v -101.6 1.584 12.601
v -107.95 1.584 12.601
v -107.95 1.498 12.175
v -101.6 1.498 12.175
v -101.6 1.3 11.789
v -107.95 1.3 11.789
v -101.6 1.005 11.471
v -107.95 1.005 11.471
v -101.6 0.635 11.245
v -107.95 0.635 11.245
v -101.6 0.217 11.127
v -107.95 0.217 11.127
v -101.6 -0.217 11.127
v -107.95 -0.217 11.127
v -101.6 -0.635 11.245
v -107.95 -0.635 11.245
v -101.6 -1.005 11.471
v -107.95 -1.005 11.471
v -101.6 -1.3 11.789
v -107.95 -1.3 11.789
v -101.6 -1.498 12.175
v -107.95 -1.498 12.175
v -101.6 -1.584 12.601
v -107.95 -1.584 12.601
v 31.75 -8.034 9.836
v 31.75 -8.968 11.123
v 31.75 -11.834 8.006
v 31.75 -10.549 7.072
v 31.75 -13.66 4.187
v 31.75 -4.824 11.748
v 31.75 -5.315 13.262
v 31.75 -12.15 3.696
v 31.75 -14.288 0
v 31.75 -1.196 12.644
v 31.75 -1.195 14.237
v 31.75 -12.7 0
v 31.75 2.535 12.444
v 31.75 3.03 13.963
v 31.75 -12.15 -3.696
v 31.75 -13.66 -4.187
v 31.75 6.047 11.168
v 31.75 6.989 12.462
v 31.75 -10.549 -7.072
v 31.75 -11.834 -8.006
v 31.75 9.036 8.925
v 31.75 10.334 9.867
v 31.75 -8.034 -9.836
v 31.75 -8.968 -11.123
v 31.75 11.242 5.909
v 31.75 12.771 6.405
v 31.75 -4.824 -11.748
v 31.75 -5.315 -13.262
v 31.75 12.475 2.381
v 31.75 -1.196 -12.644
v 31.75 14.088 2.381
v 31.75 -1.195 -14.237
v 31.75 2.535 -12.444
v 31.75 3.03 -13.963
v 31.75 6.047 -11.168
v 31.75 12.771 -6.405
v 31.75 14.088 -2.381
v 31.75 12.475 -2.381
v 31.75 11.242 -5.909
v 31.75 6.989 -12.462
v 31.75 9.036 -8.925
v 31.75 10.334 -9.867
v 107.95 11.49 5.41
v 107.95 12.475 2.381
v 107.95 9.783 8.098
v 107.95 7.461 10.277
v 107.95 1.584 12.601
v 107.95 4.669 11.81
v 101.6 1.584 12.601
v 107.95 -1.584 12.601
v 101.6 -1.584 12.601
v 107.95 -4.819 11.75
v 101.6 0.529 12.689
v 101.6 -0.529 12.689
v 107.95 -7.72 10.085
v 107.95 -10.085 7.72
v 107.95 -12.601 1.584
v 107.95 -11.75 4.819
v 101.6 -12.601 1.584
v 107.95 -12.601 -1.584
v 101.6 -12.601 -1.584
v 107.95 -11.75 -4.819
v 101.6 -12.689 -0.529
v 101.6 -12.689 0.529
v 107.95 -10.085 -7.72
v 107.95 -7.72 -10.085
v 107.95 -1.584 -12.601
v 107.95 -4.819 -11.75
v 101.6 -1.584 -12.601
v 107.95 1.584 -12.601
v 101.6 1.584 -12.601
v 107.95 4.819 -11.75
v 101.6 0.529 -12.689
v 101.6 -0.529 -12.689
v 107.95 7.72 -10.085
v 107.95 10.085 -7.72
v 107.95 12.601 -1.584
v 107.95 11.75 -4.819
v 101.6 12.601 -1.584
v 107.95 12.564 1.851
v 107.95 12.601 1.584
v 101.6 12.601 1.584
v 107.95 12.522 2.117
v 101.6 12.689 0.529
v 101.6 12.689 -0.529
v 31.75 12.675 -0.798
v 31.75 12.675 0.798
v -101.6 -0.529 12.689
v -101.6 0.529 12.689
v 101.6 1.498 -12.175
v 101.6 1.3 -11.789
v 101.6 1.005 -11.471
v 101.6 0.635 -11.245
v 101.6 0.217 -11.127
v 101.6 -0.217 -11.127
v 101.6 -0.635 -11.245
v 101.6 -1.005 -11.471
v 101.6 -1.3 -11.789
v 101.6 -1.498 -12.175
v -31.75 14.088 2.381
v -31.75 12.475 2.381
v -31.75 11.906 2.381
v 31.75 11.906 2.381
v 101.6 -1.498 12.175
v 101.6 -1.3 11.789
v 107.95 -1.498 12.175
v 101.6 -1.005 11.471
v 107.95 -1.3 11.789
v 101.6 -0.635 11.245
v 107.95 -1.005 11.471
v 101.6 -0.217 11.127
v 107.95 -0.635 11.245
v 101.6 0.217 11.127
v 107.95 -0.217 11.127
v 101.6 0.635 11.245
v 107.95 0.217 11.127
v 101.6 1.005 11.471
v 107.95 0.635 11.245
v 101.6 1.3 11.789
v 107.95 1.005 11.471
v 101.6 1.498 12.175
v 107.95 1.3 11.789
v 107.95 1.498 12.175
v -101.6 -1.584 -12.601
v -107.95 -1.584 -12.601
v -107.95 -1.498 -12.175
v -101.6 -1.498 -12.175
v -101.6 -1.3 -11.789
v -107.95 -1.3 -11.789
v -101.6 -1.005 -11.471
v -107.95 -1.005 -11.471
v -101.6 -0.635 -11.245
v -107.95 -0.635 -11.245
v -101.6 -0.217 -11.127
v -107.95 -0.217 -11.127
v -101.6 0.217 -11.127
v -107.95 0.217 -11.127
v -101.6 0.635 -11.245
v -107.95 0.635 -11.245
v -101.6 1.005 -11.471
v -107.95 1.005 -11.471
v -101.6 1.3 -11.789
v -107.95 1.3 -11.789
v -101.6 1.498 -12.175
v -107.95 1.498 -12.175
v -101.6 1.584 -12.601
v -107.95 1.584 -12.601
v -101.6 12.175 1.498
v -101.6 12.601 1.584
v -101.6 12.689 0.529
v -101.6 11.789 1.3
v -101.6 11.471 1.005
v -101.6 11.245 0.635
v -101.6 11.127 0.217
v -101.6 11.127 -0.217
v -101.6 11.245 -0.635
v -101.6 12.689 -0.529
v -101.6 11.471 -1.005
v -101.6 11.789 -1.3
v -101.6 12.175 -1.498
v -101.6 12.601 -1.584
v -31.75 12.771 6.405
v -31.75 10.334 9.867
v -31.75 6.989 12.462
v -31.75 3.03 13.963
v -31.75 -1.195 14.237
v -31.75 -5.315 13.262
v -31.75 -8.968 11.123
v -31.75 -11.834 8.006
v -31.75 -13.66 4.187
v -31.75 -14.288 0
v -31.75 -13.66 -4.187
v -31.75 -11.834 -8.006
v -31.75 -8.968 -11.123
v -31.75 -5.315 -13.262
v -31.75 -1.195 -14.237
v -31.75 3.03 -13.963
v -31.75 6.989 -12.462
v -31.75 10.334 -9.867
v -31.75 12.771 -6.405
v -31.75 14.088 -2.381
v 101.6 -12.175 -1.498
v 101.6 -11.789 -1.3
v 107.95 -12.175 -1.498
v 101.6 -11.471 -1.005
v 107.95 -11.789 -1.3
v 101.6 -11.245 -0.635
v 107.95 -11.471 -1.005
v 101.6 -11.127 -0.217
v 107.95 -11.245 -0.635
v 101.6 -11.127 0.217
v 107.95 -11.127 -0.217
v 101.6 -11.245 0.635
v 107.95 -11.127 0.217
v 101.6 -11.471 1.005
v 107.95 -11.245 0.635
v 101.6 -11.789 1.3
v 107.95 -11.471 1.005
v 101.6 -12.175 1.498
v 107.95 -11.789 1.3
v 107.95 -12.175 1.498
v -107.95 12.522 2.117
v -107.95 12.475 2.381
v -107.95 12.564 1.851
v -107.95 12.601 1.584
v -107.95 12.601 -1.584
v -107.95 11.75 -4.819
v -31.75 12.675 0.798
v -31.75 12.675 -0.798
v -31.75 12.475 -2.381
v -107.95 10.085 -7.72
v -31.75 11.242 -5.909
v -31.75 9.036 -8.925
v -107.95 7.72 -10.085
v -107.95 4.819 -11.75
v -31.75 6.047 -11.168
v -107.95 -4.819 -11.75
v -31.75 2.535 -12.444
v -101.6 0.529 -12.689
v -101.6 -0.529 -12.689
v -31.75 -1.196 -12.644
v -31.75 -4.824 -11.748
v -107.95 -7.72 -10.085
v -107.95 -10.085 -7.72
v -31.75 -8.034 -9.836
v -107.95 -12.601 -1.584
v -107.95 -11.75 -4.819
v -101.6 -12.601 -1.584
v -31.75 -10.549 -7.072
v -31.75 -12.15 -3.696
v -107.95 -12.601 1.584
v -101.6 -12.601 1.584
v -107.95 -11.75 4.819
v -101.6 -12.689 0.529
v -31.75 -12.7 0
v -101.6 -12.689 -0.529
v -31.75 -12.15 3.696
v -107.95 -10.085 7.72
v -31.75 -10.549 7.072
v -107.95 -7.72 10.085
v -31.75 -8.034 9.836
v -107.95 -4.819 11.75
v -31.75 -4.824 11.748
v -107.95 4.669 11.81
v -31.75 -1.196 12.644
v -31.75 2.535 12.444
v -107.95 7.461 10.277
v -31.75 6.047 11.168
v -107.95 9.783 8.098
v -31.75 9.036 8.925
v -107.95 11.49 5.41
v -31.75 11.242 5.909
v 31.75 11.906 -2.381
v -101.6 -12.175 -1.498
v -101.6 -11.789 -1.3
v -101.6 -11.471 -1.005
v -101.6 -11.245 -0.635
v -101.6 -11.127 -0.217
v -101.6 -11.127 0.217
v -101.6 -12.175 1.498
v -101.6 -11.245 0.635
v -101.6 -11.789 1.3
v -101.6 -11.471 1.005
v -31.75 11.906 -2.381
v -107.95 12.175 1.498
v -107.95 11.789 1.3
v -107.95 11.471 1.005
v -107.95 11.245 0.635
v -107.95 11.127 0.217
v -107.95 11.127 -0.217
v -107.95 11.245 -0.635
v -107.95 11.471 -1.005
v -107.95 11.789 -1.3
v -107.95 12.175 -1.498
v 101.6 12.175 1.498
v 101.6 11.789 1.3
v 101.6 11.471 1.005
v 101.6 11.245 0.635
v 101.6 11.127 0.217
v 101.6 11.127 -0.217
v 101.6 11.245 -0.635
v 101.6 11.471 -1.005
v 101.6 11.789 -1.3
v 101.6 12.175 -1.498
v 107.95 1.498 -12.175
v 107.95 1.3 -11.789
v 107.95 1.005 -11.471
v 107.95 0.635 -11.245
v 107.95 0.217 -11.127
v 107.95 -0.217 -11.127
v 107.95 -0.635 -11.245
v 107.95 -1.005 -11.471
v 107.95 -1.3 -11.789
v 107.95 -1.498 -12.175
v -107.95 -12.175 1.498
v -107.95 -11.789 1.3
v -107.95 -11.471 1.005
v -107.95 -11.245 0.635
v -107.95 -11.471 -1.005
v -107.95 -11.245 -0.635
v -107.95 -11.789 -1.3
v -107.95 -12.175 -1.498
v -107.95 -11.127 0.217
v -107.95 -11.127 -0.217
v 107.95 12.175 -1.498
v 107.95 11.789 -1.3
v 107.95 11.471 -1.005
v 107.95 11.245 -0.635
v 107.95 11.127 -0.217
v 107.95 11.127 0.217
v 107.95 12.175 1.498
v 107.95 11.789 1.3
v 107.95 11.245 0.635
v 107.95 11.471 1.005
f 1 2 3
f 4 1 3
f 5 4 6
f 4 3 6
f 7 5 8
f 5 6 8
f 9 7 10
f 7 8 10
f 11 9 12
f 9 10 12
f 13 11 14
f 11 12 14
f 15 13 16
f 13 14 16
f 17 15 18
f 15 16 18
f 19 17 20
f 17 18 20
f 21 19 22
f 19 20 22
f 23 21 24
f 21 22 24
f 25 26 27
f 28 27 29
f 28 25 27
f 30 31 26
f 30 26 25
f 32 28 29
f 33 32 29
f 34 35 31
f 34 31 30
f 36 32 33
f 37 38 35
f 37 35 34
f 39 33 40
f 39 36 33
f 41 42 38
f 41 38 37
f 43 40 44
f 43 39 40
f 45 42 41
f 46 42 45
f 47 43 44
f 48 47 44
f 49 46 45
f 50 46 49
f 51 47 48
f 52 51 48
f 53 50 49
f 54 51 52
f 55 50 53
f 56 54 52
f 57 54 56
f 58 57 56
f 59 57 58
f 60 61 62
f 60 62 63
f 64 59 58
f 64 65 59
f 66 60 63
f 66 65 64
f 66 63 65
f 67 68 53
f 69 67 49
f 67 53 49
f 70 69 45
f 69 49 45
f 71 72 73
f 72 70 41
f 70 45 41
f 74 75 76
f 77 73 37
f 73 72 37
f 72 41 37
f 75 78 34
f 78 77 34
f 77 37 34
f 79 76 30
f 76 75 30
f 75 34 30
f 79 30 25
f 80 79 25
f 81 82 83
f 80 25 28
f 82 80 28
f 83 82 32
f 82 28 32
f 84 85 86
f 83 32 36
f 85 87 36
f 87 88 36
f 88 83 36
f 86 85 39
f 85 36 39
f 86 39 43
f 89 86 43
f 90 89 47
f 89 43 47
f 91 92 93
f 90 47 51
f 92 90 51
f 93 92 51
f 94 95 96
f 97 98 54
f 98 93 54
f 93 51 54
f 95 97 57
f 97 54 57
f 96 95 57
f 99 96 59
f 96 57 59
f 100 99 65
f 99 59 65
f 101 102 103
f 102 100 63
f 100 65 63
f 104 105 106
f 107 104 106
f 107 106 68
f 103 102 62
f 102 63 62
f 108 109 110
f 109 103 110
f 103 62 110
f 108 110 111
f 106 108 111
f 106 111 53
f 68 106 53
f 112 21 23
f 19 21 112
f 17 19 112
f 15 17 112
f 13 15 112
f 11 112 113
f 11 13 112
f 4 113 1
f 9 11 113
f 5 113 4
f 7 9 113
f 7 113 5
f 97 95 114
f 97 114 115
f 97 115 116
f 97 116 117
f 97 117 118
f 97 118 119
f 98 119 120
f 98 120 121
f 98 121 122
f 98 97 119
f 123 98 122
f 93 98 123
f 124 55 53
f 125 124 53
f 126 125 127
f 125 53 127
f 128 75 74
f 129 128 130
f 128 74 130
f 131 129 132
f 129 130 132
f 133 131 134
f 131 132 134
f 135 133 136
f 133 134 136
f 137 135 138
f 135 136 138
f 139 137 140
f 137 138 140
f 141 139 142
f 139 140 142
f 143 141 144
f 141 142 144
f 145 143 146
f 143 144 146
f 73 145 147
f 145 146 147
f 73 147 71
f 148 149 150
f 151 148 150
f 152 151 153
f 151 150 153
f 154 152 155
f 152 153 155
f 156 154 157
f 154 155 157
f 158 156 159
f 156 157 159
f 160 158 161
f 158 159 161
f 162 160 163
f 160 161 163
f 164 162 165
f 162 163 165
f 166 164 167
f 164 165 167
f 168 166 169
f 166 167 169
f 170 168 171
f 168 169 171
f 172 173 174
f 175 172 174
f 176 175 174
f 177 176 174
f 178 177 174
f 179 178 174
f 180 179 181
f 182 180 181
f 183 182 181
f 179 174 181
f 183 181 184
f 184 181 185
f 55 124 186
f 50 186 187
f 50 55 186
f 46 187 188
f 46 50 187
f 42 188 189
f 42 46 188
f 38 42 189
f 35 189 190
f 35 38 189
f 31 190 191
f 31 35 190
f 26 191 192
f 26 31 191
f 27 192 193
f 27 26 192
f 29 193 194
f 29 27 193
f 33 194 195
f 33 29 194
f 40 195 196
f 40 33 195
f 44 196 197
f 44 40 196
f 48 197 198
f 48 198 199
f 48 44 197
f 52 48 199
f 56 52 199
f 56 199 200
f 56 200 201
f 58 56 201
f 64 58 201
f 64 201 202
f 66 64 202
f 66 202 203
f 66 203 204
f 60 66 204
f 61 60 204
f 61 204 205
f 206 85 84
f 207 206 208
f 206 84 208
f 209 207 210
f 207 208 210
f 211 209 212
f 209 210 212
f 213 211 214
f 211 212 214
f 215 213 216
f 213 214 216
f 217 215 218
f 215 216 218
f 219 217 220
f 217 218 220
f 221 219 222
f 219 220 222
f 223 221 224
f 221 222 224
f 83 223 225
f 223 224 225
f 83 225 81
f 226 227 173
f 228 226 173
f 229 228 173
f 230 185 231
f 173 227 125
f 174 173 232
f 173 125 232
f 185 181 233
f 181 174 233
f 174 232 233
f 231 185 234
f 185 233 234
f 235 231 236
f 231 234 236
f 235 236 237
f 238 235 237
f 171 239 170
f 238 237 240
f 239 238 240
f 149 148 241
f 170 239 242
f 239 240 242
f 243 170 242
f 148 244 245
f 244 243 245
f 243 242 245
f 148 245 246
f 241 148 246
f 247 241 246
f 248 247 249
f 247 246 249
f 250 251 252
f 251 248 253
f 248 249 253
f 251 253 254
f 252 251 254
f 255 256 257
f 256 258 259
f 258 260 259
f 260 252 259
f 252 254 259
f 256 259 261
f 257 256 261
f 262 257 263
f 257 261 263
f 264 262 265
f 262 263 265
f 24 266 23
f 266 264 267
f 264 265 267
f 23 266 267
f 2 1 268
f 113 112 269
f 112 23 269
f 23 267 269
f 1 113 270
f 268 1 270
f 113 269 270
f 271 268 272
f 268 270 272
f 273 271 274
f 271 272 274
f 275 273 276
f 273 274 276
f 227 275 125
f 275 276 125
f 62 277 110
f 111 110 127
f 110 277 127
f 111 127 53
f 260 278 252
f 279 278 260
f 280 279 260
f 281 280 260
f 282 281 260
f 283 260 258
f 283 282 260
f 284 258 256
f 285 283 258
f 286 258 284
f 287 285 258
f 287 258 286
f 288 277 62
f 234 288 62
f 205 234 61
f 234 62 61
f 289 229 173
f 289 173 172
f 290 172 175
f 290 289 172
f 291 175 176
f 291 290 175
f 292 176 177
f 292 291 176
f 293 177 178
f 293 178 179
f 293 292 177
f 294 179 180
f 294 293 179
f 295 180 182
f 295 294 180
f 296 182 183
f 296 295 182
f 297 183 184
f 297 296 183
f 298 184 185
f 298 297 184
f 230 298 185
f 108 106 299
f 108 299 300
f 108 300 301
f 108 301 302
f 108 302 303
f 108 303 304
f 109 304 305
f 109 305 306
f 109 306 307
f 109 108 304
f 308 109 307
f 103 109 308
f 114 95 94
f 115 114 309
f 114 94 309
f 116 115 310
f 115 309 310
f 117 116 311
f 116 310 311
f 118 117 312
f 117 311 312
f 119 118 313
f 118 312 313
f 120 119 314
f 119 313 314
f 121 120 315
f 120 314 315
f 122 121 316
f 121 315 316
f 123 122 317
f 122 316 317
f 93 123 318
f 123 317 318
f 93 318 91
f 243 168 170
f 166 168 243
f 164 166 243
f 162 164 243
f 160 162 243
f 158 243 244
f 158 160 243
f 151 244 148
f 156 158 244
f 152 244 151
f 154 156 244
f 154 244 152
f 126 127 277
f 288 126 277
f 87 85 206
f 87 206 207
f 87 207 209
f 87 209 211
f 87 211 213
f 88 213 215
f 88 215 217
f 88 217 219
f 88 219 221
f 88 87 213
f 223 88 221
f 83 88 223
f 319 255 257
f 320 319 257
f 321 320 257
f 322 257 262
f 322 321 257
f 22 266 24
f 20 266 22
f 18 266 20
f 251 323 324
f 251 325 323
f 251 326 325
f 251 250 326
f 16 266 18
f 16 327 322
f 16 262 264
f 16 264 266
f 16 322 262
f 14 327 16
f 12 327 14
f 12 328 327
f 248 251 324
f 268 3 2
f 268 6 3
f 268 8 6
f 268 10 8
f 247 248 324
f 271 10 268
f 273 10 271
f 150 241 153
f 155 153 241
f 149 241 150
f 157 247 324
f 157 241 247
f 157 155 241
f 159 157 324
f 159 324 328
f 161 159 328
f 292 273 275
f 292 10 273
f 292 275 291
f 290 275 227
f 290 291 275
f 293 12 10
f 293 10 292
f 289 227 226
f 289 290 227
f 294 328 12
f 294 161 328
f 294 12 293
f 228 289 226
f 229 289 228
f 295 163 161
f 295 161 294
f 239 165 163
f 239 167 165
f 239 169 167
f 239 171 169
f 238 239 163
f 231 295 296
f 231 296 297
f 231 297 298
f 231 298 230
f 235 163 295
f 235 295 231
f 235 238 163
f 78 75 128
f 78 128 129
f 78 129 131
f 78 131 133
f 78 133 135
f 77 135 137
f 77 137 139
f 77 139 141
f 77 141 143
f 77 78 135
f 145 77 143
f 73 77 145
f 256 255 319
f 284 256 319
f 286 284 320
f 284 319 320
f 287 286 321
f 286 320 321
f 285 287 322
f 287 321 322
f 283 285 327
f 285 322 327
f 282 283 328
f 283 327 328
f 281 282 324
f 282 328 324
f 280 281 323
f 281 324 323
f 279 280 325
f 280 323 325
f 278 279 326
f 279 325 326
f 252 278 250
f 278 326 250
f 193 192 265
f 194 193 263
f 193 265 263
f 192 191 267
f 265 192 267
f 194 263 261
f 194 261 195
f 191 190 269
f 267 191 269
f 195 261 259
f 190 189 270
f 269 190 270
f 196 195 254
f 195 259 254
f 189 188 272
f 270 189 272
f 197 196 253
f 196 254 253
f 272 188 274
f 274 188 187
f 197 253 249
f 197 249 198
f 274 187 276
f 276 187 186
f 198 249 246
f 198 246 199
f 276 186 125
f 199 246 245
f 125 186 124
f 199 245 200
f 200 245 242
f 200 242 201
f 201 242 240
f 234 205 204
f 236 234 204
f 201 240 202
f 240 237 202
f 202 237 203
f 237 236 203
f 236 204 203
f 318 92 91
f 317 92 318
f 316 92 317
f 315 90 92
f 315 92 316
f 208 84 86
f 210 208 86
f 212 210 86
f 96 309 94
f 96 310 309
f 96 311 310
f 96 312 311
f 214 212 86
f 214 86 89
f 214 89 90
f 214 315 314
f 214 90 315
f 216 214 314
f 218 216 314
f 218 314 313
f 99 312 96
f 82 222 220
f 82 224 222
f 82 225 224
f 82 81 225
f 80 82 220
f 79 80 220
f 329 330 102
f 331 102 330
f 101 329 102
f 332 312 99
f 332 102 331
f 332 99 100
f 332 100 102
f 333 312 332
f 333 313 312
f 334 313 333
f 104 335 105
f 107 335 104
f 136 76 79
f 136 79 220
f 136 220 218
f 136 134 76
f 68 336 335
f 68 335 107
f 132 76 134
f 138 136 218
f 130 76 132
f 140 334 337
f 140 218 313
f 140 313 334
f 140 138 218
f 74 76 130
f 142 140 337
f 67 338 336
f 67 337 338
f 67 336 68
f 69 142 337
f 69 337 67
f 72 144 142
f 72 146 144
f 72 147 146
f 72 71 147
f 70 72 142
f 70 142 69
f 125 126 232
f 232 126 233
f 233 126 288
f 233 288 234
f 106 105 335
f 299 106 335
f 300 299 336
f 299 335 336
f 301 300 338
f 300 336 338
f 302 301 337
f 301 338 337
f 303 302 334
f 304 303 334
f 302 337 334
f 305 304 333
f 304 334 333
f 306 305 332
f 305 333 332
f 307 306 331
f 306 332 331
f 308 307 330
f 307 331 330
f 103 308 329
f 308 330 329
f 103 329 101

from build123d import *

# Parameters (mm, degrees)
SKETCH1_R               = 14.2875
BOSS_EXTRUDE1_DEPTH     = 31.75
CUT_EXTRUDE1_DEPTH      = 63.5
SKETCH3_R               = 12.7
BOSS_EXTRUDE2_DEPTH     = 76.2
SKETCH4_R               = 12.7
BOSS_EXTRUDE3_DEPTH     = 76.2
SKETCH5_R               = 1.5875
CUT_EXTRUDE2_DEPTH      = 6.35
CIRPATTERN1_COUNT       = 4
MIRROR1_COPY_1_SKETCH_R = 1.5875
MIRROR1_COPY_1_DEPTH    = 6.35
MIRROR1_COPY_2_SKETCH_R = 1.5875
MIRROR1_COPY_2_DEPTH    = 6.35
MIRROR1_COPY_3_SKETCH_R = 1.5875
MIRROR1_COPY_3_DEPTH    = 6.35


with BuildPart() as part:
    # Sketch1 → Boss-Extrude1 (new body, symmetric)
    with BuildSketch(Plane(origin=(0, 0, 0), x_dir=(0, 0, -1), z_dir=(1, 0, 0))):
        Circle(SKETCH1_R)
    extrude(amount=BOSS_EXTRUDE1_DEPTH, both=True)

    # Sketch2 → Cut-Extrude1 (cut)
    with BuildSketch(Plane(origin=(31.75, 0, 0), x_dir=(0, 0, -1), z_dir=(1, 0, 0))):
        with BuildLine():
            Line((0, 11.90625), (2.38125, 11.90625))
            Line((2.38125, 11.90625), (2.38125, 14.087664984))
            ThreePointArc((2.38125, 14.087664984), (0, 14.2875), (-2.38125, 14.087664984))
            Line((-2.38125, 14.087664984), (-2.38125, 11.90625))
            Line((-2.38125, 11.90625), (0, 11.90625))
        make_face()
    extrude(amount=-CUT_EXTRUDE1_DEPTH, mode=Mode.SUBTRACT)

    # Sketch3 → Boss-Extrude2 (add)
    with BuildSketch(Plane(origin=(31.75, 0, 0), x_dir=(0, 0, -1), z_dir=(1, 0, 0))):
        with Locations(Location((0, 0, 0), (0, 0, 100.806922875))):  # turned: the seam where the file's is
            Circle(SKETCH3_R)
    extrude(amount=BOSS_EXTRUDE2_DEPTH)

    # Sketch4 → Boss-Extrude3 (add)
    with BuildSketch(Plane.ZY.offset(31.75)):
        with Locations(Location((0, 0, 0), (0, 0, 79.193077125))):  # turned: the seam where the file's is
            Circle(SKETCH4_R)
    extrude(amount=BOSS_EXTRUDE3_DEPTH)

    # Sketch5 → Cut-Extrude2 (cut)
    with BuildSketch(Plane(origin=(107.95, 0, 0), x_dir=(0, 0, -1), z_dir=(1, 0, 0))):
        with Locations((0, 12.7)):
            Circle(SKETCH5_R)
    cut_extrude2 = extrude(amount=-CUT_EXTRUDE2_DEPTH, mode=Mode.SUBTRACT)

    # CirPattern1: Cut-Extrude2 ×4 about axis
    cirpattern1_axis = Axis((0, 0, 0), (1, 0, 0))
    for i in range(1, CIRPATTERN1_COUNT):
        add(cut_extrude2.rotate(cirpattern1_axis, i * 360 / CIRPATTERN1_COUNT), mode=Mode.SUBTRACT)

    # Mirror1: Cut-Extrude2 across plane
    add(cut_extrude2.mirror(Plane(origin=(0, 0, 0), x_dir=(0, 0, 1), z_dir=(1, 0, 0))), mode=Mode.SUBTRACT)

    # Mirror1 copy 1 sketch → Mirror1 copy 1 (cut)
    with BuildSketch(Plane(origin=(-107.95, 0, 0), x_dir=(0, 1, 0), z_dir=(-1, 0, 0))):
        with Locations((0, -12.7)):
            Circle(MIRROR1_COPY_1_SKETCH_R)
    extrude(amount=-MIRROR1_COPY_1_DEPTH, mode=Mode.SUBTRACT)

    # Mirror1 copy 2 sketch → Mirror1 copy 2 (cut)
    with BuildSketch(Plane.ZY.offset(107.95)):
        with Locations((0, -12.7)):
            Circle(MIRROR1_COPY_2_SKETCH_R)
    extrude(amount=-MIRROR1_COPY_2_DEPTH, mode=Mode.SUBTRACT)

    # Mirror1 copy 3 sketch → Mirror1 copy 3 (cut)
    with BuildSketch(Plane(origin=(-107.95, 0, 0), x_dir=(0, -1, 0), z_dir=(-1, 0, 0))):
        with Locations((0, -12.7)):
            Circle(MIRROR1_COPY_3_SKETCH_R)
    extrude(amount=-MIRROR1_COPY_3_DEPTH, mode=Mode.SUBTRACT)


solid = part.part
